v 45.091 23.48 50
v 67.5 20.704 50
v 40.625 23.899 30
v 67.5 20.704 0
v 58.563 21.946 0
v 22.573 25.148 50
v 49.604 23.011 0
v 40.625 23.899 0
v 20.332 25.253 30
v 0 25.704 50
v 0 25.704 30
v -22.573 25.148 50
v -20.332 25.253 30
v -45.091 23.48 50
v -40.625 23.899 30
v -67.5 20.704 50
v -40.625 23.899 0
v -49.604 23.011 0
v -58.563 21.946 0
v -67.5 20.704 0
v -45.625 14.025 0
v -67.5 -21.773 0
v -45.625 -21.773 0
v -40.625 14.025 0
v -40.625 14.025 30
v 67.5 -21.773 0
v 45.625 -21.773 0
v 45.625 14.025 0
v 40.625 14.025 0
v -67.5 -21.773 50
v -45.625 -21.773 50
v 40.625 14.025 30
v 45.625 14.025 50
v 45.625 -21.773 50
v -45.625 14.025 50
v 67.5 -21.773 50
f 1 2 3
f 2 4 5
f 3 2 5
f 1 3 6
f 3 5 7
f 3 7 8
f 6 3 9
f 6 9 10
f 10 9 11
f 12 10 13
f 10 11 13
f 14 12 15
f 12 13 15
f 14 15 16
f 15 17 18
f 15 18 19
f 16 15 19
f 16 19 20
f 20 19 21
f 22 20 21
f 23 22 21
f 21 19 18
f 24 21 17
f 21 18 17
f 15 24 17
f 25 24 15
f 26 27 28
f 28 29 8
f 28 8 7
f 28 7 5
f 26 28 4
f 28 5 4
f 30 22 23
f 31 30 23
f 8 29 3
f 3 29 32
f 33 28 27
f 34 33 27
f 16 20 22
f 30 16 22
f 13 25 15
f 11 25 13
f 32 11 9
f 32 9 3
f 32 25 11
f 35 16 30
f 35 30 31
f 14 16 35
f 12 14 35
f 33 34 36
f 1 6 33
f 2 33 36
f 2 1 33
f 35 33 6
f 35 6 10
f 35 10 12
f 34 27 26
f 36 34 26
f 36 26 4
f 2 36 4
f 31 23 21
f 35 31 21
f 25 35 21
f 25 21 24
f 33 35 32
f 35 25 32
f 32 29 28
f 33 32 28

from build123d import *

# Parameters (mm, degrees)
F1_DEPTH = 50
F2_W     = 81.249358
F2_H     = 37.196705
F3_DEPTH = 30


with BuildPart() as f1:
    # F0 (on Top) → F1 (new body)
    with BuildSketch(Plane.XY):
        with BuildLine():
            ThreePointArc((67.5, 20.704213), (0, 25.704213), (-67.5, 20.704213))
            Line((-67.5, 20.704213), (-67.5, -21.772621))
            Line((-67.5, -21.772621), (-45.624679, -21.772621))
            Line((-45.624679, -21.772621), (-45.624679, 14.025466))
            Line((-45.624679, 14.025466), (0, 14.025466))
            Line((0, 14.025466), (45.624679, 14.025466))
            Line((45.624679, 14.025466), (45.624679, -21.772621))
            Line((45.624679, -21.772621), (67.5, -21.772621))
            Line((67.5, -21.772621), (67.5, 20.704213))
        make_face()
    extrude(amount=F1_DEPTH)

    # F2 (on Front) → F3 (cut)
    with BuildSketch(Plane.XZ):
        with Locations((0, 11.401647)):
            Rectangle(F2_W, F2_H)
    extrude(amount=-F3_DEPTH, mode=Mode.SUBTRACT)


solid = f1.part
